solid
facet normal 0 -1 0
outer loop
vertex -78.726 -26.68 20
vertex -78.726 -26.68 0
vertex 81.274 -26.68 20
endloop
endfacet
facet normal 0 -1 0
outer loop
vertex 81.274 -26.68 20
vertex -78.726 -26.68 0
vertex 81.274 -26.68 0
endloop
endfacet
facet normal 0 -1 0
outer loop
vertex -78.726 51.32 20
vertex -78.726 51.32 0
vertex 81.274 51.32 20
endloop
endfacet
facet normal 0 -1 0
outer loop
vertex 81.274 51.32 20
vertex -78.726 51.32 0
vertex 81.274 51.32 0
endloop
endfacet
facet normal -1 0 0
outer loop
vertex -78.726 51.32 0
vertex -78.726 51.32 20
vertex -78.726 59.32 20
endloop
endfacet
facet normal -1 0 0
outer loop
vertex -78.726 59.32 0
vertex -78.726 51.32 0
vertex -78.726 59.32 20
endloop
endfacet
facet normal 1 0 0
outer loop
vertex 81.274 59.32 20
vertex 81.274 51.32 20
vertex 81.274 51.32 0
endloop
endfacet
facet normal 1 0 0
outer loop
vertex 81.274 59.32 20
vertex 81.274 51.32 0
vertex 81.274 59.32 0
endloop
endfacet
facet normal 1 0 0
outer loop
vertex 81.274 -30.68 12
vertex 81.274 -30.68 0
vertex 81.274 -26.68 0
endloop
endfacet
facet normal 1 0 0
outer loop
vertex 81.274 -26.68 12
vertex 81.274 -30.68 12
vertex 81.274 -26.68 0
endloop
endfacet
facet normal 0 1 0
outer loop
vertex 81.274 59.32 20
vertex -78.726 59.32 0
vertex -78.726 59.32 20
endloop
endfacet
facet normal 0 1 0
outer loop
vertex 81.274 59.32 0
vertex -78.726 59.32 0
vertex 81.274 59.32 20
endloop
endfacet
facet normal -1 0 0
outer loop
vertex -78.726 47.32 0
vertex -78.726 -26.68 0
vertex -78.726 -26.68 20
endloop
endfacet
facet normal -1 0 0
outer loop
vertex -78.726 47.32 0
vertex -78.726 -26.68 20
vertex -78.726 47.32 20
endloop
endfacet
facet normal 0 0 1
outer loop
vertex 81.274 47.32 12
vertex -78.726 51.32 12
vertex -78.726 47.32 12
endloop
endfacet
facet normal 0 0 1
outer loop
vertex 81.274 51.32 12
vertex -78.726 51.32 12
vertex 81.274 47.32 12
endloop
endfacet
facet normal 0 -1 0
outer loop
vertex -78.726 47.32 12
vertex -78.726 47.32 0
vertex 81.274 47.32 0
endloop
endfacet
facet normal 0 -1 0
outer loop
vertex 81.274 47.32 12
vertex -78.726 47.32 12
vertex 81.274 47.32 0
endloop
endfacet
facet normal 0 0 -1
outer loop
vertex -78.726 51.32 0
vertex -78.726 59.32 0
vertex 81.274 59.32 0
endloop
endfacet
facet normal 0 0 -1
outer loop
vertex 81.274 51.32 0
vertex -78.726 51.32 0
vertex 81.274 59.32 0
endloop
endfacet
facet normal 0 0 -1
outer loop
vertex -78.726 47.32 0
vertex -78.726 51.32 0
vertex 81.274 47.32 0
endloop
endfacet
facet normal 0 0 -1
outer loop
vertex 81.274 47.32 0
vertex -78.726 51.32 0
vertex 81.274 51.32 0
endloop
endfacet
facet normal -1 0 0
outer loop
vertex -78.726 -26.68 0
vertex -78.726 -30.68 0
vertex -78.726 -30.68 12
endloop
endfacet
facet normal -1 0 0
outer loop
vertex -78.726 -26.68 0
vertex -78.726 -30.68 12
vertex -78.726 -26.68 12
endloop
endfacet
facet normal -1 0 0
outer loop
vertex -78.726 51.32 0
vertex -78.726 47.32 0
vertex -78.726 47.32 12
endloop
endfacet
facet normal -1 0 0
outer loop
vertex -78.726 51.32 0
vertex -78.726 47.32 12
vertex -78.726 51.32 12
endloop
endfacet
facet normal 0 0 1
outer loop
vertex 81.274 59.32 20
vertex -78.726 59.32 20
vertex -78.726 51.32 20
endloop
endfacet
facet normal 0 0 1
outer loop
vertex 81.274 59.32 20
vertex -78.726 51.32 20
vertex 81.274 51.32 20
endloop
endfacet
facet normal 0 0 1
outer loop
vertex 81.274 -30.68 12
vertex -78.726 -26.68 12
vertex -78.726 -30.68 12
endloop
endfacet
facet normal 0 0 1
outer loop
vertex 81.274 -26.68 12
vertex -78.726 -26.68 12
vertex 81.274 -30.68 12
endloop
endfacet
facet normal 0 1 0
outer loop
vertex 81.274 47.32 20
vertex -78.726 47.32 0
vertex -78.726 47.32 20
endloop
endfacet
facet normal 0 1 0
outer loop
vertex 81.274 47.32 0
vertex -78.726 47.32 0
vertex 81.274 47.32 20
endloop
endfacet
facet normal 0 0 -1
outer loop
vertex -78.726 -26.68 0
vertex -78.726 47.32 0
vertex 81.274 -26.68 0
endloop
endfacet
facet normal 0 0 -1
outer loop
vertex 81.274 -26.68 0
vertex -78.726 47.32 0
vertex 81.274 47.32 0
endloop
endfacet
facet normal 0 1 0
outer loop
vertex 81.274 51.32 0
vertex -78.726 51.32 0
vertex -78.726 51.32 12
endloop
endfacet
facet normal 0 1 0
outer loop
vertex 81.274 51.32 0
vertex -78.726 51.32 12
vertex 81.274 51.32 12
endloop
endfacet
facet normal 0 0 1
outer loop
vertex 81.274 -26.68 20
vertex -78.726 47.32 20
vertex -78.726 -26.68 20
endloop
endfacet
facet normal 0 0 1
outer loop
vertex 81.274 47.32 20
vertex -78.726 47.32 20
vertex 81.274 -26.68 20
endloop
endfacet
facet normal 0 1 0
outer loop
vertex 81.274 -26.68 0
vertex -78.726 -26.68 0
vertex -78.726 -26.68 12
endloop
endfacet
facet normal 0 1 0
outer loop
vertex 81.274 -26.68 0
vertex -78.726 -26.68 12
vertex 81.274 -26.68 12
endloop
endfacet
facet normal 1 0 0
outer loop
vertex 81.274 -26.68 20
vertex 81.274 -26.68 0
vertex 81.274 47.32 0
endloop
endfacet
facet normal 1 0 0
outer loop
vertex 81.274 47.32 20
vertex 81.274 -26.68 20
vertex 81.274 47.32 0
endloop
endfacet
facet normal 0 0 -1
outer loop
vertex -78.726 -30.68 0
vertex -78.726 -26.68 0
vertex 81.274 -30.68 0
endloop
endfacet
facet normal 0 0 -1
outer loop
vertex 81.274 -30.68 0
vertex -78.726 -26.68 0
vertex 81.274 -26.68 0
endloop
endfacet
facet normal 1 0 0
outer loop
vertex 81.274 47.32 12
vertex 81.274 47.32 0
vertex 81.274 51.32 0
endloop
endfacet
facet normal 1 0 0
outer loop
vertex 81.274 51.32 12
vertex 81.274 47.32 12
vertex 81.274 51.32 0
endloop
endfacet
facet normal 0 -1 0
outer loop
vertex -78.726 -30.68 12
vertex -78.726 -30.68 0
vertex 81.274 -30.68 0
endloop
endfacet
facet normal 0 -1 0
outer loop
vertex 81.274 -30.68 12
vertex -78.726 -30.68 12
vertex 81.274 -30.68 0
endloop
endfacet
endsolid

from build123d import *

# Parameters (mm, degrees)
F0_W     = 160
F0_H     = 8
F0_H_2   = 74
F1_DEPTH = 20
F0_H_3   = 4
F2_DEPTH = 12


with BuildPart() as f1:
    # F0 (on Top) → F1 (new body)
    with BuildSketch(Plane.XY):
        with Locations((1.274489, 55.319962)):
            Rectangle(F0_W, F0_H)
        with Locations((1.274489, 10.319962)):
            Rectangle(F0_W, F0_H_2)
    extrude(amount=F1_DEPTH)


with BuildPart() as f2:
    # F0 (on Top) → F2 (new body)
    with BuildSketch(Plane.XY):
        with Locations((1.274489, 49.319962)):
            Rectangle(F0_W, F0_H_3)
        with Locations((1.274489, -28.680038)):
            Rectangle(F0_W, F0_H_3)
    extrude(amount=F2_DEPTH)


solid = Compound([f1.part, f2.part])
